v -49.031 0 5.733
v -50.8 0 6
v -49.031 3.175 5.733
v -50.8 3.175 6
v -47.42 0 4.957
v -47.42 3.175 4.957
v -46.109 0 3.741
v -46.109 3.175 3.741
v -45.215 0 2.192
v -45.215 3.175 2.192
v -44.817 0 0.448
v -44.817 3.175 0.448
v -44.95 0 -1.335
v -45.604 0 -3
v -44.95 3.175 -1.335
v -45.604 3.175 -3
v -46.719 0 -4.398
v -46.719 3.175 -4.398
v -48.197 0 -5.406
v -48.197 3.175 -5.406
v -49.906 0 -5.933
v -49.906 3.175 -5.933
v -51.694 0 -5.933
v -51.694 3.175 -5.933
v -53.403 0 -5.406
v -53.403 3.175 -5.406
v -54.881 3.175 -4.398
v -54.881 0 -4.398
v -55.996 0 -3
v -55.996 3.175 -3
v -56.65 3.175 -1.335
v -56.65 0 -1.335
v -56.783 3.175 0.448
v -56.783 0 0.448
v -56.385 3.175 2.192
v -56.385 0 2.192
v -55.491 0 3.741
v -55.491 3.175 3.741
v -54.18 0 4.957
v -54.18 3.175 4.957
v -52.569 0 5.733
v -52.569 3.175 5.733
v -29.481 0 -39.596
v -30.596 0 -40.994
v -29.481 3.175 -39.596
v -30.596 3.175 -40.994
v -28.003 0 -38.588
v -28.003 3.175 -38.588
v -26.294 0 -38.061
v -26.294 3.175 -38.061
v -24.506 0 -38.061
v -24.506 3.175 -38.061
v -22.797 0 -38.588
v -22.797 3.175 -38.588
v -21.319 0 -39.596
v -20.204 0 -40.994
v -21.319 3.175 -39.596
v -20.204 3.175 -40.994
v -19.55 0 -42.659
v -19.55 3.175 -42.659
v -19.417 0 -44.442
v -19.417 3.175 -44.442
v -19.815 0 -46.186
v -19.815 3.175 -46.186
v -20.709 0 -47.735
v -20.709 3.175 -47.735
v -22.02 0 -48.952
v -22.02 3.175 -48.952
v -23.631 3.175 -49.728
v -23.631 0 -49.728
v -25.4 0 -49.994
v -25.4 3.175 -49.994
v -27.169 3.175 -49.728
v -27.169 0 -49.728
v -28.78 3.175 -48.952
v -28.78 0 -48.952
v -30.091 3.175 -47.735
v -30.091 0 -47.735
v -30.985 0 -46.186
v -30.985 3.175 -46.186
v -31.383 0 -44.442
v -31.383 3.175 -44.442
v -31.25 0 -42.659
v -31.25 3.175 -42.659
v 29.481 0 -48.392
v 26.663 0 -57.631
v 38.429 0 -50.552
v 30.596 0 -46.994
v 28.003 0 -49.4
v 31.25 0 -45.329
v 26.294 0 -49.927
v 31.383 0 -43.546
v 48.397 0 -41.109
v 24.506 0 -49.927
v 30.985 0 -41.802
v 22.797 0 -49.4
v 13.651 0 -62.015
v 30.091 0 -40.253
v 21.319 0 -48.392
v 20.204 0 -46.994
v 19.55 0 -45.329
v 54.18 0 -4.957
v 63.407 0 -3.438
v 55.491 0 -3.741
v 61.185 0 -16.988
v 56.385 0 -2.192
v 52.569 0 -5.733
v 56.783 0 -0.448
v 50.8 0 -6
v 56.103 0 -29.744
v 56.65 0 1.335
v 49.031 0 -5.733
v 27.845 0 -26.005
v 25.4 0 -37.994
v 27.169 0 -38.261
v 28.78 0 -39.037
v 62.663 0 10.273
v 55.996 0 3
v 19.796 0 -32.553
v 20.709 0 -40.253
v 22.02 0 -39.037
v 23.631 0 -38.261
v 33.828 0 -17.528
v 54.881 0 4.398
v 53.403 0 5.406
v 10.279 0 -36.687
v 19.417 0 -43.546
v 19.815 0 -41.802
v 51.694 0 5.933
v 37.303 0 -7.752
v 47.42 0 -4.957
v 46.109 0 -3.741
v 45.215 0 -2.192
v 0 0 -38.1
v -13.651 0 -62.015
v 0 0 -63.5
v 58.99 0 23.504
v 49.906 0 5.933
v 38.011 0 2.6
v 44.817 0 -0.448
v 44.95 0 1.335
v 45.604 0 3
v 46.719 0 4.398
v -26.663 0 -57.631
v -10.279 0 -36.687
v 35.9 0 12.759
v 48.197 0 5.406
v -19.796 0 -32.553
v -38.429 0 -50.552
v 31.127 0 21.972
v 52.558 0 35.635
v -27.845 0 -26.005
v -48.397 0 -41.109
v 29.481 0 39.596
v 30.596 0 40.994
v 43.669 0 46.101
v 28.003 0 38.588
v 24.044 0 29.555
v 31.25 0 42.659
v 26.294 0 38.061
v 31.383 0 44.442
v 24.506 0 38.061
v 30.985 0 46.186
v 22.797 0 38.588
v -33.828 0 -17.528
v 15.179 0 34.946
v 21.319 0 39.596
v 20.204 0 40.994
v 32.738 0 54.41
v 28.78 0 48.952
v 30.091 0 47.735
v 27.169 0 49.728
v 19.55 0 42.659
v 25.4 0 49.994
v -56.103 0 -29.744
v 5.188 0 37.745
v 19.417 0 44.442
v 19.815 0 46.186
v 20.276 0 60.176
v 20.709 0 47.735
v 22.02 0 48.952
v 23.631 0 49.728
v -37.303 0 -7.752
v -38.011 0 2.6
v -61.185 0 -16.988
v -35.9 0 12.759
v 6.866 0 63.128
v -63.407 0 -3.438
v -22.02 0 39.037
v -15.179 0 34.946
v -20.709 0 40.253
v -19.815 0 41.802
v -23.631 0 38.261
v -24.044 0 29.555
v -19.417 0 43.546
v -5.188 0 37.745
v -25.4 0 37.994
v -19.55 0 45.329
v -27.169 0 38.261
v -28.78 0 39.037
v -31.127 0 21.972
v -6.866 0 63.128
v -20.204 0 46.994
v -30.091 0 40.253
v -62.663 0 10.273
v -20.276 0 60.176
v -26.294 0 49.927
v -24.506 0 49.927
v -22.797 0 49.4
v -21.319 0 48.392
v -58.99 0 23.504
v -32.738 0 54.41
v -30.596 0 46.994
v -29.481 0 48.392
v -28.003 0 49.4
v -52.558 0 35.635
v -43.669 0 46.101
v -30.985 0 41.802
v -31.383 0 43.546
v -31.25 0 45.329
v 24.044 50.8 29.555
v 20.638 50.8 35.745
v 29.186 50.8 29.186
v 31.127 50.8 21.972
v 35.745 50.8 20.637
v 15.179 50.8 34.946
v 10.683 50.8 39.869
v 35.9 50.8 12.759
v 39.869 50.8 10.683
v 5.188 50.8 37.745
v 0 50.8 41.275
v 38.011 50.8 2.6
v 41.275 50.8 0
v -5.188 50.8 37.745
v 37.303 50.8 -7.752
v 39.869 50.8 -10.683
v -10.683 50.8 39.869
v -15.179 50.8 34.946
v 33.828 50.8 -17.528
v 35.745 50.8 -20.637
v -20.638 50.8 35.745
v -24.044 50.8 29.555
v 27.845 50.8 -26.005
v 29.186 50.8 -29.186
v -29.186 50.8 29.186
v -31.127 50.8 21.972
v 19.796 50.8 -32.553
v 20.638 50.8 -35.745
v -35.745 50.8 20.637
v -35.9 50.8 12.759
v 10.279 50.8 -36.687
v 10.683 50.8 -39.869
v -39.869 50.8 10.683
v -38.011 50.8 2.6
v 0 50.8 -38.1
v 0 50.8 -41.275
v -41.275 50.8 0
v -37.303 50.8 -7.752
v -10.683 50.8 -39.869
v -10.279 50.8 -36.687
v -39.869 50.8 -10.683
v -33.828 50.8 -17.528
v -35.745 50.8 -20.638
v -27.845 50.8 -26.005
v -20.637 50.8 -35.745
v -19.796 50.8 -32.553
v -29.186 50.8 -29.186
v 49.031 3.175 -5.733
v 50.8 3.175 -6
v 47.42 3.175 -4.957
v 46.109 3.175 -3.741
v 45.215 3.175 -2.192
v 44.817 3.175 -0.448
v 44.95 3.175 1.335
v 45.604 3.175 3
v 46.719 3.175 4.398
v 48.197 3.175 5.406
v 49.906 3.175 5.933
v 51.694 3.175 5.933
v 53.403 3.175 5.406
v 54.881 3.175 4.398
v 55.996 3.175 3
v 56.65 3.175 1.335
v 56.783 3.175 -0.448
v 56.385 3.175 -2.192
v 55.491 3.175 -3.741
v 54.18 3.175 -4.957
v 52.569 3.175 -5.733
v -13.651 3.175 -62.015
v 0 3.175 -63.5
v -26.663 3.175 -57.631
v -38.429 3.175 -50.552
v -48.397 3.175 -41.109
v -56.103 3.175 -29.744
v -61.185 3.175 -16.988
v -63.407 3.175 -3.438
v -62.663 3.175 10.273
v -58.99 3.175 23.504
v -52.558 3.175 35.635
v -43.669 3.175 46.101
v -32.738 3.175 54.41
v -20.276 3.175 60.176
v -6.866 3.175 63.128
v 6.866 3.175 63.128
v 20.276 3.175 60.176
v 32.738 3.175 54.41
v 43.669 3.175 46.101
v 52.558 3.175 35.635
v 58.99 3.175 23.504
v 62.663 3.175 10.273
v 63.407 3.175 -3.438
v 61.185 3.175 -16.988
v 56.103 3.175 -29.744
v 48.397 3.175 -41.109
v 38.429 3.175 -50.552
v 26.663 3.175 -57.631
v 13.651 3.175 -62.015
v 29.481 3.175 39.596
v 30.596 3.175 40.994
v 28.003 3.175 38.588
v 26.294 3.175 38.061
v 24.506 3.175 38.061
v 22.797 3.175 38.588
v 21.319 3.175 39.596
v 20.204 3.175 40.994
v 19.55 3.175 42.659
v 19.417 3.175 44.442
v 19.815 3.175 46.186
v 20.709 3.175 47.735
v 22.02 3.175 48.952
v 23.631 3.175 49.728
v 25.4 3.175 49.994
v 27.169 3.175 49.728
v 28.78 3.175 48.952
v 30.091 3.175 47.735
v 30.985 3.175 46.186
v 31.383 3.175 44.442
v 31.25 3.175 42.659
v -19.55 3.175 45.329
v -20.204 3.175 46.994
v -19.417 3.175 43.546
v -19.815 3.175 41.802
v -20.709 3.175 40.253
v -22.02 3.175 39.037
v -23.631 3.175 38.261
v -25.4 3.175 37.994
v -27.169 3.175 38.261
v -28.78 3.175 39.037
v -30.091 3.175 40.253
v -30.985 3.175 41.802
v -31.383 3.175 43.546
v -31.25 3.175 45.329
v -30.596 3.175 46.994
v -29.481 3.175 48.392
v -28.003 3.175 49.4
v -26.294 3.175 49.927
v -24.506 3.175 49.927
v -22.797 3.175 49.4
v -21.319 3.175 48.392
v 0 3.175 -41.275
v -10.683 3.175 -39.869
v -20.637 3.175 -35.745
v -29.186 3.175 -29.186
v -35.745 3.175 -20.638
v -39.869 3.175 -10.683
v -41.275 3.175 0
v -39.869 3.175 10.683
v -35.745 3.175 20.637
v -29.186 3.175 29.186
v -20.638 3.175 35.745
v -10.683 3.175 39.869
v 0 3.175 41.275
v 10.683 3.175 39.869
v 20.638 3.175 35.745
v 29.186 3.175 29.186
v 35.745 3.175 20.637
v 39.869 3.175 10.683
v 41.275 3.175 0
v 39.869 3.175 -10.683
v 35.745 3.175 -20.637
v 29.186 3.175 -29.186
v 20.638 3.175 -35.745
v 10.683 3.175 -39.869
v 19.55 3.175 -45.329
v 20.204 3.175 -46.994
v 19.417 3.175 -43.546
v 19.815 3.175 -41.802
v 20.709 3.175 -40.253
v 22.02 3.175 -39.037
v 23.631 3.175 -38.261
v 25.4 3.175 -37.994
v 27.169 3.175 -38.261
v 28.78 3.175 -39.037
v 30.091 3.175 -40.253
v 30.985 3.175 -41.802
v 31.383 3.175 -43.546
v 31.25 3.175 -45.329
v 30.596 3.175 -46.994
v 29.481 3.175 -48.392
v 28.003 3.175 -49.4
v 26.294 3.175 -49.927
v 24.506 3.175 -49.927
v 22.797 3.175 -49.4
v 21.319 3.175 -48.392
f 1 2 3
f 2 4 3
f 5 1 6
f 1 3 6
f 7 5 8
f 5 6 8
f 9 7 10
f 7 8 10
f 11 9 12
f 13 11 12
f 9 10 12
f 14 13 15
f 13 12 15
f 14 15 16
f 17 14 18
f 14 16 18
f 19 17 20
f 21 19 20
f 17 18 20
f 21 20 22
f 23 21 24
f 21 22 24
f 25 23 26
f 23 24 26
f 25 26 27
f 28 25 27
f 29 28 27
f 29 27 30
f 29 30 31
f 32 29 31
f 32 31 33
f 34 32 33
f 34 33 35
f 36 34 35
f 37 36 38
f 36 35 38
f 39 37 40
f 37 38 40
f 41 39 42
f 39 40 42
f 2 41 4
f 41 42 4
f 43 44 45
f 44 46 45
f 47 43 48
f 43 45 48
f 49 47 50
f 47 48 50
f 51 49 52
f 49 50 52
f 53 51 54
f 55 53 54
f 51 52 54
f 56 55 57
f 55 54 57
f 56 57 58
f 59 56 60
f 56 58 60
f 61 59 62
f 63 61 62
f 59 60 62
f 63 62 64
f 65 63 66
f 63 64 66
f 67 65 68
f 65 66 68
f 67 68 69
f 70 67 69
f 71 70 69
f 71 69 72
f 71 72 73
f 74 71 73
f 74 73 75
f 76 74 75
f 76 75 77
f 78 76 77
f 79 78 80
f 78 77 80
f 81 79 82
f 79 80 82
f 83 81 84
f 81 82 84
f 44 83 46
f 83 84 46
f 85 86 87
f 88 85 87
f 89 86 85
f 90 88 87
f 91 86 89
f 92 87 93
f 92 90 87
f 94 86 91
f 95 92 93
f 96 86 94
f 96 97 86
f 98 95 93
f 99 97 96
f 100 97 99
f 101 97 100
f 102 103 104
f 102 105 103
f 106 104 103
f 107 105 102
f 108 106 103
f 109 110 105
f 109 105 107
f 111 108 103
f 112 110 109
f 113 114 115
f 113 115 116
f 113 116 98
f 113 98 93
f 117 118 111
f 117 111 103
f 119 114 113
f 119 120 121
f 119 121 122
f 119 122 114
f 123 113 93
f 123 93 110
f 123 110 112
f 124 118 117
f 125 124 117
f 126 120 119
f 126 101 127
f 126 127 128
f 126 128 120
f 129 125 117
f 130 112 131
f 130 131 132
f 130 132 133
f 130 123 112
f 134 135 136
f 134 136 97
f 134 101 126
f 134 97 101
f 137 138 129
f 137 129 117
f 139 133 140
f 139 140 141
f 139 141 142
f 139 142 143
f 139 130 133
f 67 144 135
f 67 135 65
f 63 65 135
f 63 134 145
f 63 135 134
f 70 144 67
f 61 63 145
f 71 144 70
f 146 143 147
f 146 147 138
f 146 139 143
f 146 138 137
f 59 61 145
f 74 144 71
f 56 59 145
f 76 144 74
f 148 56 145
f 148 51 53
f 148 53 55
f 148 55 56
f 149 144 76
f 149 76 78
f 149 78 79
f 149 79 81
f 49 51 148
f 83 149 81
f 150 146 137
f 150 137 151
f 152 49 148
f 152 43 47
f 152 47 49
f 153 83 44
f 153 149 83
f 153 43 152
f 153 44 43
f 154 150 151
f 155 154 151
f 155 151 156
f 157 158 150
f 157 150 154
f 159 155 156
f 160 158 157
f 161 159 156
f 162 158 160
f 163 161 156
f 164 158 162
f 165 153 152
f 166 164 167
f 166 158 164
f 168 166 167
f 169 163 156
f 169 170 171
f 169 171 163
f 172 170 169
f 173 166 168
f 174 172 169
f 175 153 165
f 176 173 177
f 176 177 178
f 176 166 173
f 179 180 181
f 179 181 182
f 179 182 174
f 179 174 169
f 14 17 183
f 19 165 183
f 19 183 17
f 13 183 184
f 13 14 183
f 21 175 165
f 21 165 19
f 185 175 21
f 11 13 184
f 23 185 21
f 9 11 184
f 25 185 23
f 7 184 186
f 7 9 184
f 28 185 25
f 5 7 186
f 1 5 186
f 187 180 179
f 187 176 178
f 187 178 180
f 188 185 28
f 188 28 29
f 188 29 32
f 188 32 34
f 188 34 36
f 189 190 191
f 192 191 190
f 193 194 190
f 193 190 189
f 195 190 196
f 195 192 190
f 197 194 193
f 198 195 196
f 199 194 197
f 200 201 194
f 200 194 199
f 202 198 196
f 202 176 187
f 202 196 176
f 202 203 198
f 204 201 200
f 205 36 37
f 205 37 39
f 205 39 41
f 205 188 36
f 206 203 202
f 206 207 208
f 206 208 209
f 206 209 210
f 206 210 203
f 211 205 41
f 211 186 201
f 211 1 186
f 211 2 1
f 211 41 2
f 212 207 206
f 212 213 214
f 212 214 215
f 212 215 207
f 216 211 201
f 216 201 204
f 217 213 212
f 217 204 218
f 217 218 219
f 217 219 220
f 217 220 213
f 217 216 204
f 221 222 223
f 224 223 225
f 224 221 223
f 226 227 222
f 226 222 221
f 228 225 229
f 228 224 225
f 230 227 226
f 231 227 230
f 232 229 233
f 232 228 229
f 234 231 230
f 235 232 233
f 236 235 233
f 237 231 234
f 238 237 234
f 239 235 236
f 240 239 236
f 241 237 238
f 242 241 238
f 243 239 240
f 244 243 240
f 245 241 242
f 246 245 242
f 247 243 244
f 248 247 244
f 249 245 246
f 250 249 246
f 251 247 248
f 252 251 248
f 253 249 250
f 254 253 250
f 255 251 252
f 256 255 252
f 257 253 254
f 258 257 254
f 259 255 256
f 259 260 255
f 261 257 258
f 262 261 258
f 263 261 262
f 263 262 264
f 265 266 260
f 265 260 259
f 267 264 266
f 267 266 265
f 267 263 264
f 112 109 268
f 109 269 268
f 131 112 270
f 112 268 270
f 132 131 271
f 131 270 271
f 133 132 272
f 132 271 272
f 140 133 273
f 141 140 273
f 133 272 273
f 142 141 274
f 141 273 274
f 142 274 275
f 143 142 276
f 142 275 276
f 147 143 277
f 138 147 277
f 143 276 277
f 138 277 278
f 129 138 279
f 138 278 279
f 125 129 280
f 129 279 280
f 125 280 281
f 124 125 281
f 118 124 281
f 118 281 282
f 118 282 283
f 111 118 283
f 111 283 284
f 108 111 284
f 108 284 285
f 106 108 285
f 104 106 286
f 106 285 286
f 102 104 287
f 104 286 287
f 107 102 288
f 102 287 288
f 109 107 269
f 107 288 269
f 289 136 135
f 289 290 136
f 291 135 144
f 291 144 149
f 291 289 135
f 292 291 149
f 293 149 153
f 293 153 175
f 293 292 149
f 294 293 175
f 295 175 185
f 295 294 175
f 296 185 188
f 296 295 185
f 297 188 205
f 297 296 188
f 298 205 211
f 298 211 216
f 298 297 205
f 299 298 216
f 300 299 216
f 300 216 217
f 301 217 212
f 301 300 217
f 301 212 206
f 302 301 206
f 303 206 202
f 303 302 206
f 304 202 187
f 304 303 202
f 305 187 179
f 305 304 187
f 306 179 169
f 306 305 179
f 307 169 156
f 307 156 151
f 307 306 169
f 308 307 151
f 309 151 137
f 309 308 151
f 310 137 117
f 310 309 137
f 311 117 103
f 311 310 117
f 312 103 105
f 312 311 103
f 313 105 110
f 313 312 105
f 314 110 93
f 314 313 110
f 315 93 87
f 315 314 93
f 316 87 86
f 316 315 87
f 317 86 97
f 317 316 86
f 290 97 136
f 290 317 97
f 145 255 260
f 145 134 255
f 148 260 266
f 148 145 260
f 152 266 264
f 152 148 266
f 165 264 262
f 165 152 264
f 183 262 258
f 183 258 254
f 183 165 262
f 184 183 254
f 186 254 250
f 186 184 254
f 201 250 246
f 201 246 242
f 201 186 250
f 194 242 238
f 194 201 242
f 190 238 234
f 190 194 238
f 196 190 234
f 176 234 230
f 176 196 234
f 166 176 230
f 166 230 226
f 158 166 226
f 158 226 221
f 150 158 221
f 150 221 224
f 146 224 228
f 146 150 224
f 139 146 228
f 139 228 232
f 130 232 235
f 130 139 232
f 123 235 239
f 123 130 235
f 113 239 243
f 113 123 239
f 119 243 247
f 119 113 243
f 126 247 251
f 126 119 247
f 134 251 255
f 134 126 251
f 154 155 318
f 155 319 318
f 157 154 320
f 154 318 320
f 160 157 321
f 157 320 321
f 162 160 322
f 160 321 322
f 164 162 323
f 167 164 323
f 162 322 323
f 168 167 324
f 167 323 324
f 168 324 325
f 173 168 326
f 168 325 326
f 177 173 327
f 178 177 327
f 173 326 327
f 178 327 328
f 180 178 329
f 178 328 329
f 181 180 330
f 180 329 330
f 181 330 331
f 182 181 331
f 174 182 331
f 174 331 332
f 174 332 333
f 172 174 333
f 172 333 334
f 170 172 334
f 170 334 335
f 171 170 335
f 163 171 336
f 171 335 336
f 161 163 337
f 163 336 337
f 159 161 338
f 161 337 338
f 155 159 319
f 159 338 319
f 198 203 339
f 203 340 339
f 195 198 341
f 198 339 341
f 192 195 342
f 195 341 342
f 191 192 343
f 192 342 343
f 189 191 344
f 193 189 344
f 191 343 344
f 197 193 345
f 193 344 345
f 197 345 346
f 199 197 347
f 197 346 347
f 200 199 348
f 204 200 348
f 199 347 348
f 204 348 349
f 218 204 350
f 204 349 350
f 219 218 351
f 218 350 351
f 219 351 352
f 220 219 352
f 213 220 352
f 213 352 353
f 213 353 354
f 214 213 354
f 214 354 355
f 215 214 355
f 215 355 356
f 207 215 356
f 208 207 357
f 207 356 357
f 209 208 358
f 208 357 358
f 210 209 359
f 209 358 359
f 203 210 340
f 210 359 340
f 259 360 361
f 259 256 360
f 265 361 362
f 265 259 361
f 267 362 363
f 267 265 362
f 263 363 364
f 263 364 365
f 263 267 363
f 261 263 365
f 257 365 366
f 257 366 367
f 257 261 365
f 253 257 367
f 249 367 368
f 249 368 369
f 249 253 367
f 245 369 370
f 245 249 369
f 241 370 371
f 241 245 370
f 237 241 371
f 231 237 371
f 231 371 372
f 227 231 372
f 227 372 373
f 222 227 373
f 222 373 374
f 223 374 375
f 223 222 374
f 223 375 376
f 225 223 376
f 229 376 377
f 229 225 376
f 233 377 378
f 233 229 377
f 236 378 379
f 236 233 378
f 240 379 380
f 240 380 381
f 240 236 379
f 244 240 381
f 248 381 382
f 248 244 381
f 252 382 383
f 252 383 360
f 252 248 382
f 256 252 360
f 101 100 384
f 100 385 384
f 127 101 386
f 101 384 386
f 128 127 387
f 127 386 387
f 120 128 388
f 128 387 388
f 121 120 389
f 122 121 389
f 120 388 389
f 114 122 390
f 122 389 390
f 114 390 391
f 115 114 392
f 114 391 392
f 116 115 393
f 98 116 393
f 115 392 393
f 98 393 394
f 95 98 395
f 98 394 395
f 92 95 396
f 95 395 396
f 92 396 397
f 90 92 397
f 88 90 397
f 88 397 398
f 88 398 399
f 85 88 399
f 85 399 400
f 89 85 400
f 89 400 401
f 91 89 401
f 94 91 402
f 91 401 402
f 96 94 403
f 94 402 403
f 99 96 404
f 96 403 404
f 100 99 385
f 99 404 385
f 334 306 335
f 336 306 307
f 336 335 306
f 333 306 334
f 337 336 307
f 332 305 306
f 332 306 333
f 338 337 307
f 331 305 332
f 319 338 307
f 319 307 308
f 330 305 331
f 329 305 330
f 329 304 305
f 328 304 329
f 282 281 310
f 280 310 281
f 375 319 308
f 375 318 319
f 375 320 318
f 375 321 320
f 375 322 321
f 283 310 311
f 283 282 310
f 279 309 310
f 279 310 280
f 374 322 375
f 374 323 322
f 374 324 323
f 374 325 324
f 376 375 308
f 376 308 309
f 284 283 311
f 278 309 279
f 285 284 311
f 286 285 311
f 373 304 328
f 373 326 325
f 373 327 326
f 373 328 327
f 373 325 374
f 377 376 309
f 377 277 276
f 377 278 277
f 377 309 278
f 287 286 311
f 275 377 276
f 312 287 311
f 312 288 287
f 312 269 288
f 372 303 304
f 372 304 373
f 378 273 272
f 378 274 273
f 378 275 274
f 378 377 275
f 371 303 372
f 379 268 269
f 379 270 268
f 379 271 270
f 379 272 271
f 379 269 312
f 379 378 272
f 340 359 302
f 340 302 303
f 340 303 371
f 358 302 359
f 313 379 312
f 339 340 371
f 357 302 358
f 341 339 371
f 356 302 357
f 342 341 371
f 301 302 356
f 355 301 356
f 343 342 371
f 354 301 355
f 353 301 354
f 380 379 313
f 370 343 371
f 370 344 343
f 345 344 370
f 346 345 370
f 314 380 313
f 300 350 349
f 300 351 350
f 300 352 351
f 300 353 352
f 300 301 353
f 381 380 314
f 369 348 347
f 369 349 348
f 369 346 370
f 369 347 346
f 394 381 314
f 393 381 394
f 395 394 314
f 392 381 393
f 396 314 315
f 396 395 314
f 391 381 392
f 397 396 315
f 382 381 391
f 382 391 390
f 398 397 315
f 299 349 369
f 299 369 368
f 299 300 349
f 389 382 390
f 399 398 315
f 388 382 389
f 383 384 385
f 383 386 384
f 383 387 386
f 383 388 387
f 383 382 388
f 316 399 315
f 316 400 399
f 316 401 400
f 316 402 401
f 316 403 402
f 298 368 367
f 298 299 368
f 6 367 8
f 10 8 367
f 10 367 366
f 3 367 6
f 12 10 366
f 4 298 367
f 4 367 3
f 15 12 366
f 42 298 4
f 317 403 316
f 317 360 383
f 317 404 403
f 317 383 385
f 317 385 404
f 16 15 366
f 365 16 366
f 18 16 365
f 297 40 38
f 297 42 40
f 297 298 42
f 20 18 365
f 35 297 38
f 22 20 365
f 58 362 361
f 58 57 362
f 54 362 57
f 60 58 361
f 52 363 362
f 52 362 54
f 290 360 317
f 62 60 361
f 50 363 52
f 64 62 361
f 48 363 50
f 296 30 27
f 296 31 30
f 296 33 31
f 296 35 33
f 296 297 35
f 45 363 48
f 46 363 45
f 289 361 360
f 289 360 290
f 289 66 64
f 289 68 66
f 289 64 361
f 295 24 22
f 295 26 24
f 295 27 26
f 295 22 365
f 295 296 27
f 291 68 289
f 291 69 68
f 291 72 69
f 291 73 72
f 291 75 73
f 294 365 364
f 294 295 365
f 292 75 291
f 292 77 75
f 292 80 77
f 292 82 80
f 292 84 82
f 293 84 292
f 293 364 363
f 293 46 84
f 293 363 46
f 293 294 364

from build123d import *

# Parameters (mm, degrees)
SKETCH3_R          = 6
CUT_EXTRUDE1_DEPTH = 102.649597269
CIRPATTERN1_COUNT  = 6


with BuildPart() as part:
    # Sketch1 → Revolve1 (revolve)
    with BuildSketch(Plane.XY, mode=Mode.PRIVATE) as revolve1_sk:
        Polygon((-63.5, 0), (-63.5, 3.175), (-41.275, 3.175), (-41.275, 50.8), (-38.1, 50.8), (-38.1, 0), align=None)
    revolve(revolve1_sk.sketch.rotate(Axis((0, 0, 0), (0, 1, 0)), 270), axis=Axis((0, 0, 0), (0, 1, 0)))

    # Sketch3 → Cut-Extrude1 (cut, symmetric)
    with BuildSketch(Plane(origin=(0, 3.175, 0), x_dir=(1, 0, 0), z_dir=(0, 1, 0))):
        with Locations(Location((-50.8, 0, 0), (0, 0, 270))):
            Circle(SKETCH3_R)
    cut_extrude1 = extrude(amount=CUT_EXTRUDE1_DEPTH, both=True, mode=Mode.SUBTRACT)

    # CirPattern1: Cut-Extrude1 ×6 about axis
    cirpattern1_axis = Axis((0, 0, 0), (0, 1, 0))
    for i in range(1, CIRPATTERN1_COUNT):
        add(cut_extrude1.rotate(cirpattern1_axis, i * 360 / CIRPATTERN1_COUNT), mode=Mode.SUBTRACT)


solid = part.part
